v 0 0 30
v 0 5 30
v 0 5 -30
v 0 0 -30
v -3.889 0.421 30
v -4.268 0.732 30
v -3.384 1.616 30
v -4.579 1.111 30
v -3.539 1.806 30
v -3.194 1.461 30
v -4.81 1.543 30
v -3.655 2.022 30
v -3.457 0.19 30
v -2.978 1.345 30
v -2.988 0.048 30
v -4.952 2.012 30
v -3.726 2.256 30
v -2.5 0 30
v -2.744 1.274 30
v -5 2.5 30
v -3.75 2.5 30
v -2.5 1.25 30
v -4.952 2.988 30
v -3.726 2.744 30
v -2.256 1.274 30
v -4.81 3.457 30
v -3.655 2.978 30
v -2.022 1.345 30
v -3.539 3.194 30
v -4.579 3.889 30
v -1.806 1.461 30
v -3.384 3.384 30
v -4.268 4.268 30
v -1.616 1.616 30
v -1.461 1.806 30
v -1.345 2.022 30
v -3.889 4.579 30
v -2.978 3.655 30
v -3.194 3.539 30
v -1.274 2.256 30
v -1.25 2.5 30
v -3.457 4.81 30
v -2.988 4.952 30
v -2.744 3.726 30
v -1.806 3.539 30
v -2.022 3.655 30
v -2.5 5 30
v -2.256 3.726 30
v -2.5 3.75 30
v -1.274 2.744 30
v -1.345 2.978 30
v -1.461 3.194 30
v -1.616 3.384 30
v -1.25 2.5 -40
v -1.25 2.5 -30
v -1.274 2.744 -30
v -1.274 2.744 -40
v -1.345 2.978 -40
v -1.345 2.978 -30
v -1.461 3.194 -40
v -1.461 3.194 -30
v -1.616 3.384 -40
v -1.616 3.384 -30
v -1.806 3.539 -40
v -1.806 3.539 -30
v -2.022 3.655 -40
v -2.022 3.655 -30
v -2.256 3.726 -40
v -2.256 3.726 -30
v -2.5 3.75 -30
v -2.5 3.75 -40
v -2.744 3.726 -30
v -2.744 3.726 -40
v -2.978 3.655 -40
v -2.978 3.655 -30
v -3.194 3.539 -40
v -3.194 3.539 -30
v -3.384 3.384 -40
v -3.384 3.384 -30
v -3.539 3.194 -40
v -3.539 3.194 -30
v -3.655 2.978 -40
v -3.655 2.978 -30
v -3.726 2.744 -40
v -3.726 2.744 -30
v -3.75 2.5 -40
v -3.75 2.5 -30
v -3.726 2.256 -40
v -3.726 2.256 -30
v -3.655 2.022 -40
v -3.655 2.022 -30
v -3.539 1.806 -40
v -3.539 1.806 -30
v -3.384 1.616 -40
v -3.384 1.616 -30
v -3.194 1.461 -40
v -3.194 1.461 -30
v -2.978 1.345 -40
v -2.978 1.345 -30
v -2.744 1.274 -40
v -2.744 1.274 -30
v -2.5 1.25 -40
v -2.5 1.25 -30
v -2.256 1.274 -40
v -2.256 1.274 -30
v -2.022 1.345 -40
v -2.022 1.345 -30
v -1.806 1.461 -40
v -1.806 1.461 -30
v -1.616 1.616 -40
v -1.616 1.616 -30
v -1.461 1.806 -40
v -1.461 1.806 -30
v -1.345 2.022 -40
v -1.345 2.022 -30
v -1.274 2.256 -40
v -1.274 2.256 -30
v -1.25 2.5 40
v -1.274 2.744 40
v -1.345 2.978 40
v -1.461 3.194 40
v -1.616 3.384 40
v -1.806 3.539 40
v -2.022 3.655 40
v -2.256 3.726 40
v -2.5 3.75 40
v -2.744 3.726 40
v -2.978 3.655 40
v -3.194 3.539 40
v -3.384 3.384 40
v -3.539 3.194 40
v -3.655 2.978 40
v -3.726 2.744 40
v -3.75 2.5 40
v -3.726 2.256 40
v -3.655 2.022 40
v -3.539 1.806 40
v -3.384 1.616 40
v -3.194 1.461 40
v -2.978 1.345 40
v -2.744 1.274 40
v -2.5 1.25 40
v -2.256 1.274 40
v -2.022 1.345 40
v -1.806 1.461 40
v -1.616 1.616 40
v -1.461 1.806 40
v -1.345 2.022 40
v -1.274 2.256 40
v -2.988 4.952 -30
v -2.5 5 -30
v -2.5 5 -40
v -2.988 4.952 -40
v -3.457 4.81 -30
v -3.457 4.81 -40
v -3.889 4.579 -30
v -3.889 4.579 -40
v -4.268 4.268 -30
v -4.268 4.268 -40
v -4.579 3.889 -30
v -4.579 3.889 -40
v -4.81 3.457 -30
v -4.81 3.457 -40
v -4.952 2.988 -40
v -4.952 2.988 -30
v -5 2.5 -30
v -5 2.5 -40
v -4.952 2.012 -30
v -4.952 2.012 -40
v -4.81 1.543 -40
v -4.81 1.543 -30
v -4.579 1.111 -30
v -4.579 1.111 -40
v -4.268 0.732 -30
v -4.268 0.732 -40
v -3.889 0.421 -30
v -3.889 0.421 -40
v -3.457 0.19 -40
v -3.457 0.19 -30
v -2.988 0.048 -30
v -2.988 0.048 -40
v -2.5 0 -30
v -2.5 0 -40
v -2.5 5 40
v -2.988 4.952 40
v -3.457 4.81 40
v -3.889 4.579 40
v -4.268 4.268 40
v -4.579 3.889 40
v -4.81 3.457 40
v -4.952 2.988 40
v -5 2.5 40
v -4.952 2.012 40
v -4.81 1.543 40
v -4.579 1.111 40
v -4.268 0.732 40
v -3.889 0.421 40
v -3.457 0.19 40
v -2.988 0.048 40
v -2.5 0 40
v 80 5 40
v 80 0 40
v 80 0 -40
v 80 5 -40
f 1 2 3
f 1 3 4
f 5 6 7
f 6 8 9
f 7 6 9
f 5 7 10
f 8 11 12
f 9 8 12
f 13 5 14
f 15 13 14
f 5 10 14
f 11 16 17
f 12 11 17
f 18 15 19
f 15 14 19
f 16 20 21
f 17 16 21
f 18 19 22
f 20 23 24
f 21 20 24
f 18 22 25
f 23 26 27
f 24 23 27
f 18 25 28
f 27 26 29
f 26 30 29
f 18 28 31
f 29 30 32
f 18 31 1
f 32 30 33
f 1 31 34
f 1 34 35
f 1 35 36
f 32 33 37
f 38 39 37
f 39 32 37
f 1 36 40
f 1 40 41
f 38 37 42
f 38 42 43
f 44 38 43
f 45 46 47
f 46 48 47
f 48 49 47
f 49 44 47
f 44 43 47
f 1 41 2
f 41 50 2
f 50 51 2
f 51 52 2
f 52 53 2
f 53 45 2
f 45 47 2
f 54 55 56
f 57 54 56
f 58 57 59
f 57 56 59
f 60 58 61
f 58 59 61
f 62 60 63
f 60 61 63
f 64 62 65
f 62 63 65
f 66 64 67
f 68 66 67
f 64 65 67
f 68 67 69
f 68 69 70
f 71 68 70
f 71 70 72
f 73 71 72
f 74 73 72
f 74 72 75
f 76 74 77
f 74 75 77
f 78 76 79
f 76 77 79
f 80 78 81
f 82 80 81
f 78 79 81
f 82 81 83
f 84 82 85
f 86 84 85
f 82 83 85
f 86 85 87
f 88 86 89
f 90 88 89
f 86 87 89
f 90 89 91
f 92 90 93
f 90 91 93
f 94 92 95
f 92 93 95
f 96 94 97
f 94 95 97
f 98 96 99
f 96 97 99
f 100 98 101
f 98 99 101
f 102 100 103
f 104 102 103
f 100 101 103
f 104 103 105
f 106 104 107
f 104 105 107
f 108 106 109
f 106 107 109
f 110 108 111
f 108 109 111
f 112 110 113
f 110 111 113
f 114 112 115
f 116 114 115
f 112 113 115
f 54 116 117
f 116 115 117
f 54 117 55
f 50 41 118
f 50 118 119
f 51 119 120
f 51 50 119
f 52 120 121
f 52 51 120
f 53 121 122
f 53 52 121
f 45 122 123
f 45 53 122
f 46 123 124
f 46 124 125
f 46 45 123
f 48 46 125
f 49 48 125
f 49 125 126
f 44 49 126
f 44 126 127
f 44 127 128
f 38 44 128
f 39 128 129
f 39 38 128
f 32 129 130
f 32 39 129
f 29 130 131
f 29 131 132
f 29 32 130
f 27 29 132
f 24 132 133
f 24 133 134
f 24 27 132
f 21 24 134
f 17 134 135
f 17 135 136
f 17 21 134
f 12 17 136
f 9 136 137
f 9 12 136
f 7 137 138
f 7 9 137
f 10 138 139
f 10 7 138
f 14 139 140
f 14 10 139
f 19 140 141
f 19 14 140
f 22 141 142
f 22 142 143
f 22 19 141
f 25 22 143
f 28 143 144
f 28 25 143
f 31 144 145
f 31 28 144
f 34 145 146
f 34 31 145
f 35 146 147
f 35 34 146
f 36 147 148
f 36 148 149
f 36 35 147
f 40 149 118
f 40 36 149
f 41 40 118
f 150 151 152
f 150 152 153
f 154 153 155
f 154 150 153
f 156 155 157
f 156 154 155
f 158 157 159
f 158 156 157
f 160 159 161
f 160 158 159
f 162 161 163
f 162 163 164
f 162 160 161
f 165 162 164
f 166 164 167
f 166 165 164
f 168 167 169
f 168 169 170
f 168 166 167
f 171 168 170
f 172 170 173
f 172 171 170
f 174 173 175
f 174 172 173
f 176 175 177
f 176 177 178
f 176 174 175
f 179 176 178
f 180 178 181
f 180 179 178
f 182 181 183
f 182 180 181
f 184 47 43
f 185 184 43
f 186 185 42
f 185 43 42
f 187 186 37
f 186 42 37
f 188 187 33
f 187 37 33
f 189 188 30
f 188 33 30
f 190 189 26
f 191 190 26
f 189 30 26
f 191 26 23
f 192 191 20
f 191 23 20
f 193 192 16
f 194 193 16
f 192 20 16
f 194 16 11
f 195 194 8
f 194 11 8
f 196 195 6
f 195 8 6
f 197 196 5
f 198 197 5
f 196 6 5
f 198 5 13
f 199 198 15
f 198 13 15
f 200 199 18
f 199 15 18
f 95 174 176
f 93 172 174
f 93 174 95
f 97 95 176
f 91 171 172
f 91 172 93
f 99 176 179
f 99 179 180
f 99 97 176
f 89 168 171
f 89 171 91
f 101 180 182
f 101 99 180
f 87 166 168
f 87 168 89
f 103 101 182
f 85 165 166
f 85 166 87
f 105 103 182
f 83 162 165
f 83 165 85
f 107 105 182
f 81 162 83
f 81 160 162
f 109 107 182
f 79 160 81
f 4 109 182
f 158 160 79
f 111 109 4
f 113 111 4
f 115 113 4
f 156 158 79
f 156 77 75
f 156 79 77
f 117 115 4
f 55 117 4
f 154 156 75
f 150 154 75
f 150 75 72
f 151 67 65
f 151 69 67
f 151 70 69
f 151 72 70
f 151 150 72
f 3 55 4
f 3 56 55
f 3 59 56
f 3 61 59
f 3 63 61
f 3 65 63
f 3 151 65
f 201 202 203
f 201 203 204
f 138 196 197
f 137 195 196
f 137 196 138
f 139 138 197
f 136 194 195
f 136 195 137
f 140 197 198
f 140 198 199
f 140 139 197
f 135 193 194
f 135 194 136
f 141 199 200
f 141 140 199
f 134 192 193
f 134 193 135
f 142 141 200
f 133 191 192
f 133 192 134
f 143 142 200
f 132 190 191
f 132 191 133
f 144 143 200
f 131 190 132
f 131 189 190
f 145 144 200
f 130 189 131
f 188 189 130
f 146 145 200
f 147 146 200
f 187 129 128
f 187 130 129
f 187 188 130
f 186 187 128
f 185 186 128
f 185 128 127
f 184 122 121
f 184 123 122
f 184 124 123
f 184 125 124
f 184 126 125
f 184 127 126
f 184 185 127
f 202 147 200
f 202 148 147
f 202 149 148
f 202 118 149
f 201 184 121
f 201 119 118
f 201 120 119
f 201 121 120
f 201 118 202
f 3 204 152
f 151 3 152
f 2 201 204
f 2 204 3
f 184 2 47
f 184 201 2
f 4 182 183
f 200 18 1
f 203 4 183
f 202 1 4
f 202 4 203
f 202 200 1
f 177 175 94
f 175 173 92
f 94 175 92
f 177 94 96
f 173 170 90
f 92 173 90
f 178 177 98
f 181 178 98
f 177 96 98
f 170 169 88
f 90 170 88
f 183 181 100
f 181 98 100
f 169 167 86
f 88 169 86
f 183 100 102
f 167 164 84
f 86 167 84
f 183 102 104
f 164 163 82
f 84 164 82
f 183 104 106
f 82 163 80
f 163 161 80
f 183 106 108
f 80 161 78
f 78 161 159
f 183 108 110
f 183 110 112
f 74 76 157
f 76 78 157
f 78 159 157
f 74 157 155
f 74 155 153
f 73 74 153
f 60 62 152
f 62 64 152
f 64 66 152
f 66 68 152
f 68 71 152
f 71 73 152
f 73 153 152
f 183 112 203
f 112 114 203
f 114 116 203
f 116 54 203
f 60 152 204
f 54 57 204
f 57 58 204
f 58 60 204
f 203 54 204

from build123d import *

# Parameters (mm, degrees)
BOSS_EXTRUDE1_DEPTH     = 40
BOSS_EXTRUDE2_START     = 30
SKETCH2_R               = 1.25
BOSS_EXTRUDE2_DEPTH     = 10
CUT_EXTRUDE1_DEPTH      = 91
CUT_EXTRUDE1_DEPTH_BACK = 91
SKETCH3_W               = 5
SKETCH3_H               = 5


with BuildPart() as part:
    # Sketch1 → Boss-Extrude1 (new, symmetric)
    with BuildSketch(Plane.XY):
        Polygon((0, 0), (80, 0), (80, 10), (75, 10), (75, 5), (0, 5), align=None)
    extrude(amount=BOSS_EXTRUDE1_DEPTH, both=True)

    # Sketch2 → Boss-Extrude2 (add)
    with BuildSketch(Plane.XY.offset(BOSS_EXTRUDE2_START)):
        with BuildLine():
            Line((0, 5), (-2.5, 5))
            ThreePointArc((-2.5, 5), (-5, 2.5), (-2.5, 0))
            Line((-2.5, 0), (0, 0))
            Line((0, 0), (0, 5))
        make_face()
        with Locations((-2.5, 2.5)):
            Circle(SKETCH2_R, mode=Mode.SUBTRACT)
    boss_extrude2 = extrude(amount=BOSS_EXTRUDE2_DEPTH)

    # Mirror2: Boss-Extrude2 across plane
    add(boss_extrude2.mirror(Plane.XY))

    # Sketch3 → Cut-Extrude1 (cut, two sides: drawn at the far end of the back side and taken through both)
    with BuildSketch(Plane.XY.offset(-CUT_EXTRUDE1_DEPTH_BACK)):
        with Locations((77.5, 7.5)):
            Rectangle(SKETCH3_W, SKETCH3_H)
    extrude(amount=CUT_EXTRUDE1_DEPTH + CUT_EXTRUDE1_DEPTH_BACK, mode=Mode.SUBTRACT)


solid = part.part
